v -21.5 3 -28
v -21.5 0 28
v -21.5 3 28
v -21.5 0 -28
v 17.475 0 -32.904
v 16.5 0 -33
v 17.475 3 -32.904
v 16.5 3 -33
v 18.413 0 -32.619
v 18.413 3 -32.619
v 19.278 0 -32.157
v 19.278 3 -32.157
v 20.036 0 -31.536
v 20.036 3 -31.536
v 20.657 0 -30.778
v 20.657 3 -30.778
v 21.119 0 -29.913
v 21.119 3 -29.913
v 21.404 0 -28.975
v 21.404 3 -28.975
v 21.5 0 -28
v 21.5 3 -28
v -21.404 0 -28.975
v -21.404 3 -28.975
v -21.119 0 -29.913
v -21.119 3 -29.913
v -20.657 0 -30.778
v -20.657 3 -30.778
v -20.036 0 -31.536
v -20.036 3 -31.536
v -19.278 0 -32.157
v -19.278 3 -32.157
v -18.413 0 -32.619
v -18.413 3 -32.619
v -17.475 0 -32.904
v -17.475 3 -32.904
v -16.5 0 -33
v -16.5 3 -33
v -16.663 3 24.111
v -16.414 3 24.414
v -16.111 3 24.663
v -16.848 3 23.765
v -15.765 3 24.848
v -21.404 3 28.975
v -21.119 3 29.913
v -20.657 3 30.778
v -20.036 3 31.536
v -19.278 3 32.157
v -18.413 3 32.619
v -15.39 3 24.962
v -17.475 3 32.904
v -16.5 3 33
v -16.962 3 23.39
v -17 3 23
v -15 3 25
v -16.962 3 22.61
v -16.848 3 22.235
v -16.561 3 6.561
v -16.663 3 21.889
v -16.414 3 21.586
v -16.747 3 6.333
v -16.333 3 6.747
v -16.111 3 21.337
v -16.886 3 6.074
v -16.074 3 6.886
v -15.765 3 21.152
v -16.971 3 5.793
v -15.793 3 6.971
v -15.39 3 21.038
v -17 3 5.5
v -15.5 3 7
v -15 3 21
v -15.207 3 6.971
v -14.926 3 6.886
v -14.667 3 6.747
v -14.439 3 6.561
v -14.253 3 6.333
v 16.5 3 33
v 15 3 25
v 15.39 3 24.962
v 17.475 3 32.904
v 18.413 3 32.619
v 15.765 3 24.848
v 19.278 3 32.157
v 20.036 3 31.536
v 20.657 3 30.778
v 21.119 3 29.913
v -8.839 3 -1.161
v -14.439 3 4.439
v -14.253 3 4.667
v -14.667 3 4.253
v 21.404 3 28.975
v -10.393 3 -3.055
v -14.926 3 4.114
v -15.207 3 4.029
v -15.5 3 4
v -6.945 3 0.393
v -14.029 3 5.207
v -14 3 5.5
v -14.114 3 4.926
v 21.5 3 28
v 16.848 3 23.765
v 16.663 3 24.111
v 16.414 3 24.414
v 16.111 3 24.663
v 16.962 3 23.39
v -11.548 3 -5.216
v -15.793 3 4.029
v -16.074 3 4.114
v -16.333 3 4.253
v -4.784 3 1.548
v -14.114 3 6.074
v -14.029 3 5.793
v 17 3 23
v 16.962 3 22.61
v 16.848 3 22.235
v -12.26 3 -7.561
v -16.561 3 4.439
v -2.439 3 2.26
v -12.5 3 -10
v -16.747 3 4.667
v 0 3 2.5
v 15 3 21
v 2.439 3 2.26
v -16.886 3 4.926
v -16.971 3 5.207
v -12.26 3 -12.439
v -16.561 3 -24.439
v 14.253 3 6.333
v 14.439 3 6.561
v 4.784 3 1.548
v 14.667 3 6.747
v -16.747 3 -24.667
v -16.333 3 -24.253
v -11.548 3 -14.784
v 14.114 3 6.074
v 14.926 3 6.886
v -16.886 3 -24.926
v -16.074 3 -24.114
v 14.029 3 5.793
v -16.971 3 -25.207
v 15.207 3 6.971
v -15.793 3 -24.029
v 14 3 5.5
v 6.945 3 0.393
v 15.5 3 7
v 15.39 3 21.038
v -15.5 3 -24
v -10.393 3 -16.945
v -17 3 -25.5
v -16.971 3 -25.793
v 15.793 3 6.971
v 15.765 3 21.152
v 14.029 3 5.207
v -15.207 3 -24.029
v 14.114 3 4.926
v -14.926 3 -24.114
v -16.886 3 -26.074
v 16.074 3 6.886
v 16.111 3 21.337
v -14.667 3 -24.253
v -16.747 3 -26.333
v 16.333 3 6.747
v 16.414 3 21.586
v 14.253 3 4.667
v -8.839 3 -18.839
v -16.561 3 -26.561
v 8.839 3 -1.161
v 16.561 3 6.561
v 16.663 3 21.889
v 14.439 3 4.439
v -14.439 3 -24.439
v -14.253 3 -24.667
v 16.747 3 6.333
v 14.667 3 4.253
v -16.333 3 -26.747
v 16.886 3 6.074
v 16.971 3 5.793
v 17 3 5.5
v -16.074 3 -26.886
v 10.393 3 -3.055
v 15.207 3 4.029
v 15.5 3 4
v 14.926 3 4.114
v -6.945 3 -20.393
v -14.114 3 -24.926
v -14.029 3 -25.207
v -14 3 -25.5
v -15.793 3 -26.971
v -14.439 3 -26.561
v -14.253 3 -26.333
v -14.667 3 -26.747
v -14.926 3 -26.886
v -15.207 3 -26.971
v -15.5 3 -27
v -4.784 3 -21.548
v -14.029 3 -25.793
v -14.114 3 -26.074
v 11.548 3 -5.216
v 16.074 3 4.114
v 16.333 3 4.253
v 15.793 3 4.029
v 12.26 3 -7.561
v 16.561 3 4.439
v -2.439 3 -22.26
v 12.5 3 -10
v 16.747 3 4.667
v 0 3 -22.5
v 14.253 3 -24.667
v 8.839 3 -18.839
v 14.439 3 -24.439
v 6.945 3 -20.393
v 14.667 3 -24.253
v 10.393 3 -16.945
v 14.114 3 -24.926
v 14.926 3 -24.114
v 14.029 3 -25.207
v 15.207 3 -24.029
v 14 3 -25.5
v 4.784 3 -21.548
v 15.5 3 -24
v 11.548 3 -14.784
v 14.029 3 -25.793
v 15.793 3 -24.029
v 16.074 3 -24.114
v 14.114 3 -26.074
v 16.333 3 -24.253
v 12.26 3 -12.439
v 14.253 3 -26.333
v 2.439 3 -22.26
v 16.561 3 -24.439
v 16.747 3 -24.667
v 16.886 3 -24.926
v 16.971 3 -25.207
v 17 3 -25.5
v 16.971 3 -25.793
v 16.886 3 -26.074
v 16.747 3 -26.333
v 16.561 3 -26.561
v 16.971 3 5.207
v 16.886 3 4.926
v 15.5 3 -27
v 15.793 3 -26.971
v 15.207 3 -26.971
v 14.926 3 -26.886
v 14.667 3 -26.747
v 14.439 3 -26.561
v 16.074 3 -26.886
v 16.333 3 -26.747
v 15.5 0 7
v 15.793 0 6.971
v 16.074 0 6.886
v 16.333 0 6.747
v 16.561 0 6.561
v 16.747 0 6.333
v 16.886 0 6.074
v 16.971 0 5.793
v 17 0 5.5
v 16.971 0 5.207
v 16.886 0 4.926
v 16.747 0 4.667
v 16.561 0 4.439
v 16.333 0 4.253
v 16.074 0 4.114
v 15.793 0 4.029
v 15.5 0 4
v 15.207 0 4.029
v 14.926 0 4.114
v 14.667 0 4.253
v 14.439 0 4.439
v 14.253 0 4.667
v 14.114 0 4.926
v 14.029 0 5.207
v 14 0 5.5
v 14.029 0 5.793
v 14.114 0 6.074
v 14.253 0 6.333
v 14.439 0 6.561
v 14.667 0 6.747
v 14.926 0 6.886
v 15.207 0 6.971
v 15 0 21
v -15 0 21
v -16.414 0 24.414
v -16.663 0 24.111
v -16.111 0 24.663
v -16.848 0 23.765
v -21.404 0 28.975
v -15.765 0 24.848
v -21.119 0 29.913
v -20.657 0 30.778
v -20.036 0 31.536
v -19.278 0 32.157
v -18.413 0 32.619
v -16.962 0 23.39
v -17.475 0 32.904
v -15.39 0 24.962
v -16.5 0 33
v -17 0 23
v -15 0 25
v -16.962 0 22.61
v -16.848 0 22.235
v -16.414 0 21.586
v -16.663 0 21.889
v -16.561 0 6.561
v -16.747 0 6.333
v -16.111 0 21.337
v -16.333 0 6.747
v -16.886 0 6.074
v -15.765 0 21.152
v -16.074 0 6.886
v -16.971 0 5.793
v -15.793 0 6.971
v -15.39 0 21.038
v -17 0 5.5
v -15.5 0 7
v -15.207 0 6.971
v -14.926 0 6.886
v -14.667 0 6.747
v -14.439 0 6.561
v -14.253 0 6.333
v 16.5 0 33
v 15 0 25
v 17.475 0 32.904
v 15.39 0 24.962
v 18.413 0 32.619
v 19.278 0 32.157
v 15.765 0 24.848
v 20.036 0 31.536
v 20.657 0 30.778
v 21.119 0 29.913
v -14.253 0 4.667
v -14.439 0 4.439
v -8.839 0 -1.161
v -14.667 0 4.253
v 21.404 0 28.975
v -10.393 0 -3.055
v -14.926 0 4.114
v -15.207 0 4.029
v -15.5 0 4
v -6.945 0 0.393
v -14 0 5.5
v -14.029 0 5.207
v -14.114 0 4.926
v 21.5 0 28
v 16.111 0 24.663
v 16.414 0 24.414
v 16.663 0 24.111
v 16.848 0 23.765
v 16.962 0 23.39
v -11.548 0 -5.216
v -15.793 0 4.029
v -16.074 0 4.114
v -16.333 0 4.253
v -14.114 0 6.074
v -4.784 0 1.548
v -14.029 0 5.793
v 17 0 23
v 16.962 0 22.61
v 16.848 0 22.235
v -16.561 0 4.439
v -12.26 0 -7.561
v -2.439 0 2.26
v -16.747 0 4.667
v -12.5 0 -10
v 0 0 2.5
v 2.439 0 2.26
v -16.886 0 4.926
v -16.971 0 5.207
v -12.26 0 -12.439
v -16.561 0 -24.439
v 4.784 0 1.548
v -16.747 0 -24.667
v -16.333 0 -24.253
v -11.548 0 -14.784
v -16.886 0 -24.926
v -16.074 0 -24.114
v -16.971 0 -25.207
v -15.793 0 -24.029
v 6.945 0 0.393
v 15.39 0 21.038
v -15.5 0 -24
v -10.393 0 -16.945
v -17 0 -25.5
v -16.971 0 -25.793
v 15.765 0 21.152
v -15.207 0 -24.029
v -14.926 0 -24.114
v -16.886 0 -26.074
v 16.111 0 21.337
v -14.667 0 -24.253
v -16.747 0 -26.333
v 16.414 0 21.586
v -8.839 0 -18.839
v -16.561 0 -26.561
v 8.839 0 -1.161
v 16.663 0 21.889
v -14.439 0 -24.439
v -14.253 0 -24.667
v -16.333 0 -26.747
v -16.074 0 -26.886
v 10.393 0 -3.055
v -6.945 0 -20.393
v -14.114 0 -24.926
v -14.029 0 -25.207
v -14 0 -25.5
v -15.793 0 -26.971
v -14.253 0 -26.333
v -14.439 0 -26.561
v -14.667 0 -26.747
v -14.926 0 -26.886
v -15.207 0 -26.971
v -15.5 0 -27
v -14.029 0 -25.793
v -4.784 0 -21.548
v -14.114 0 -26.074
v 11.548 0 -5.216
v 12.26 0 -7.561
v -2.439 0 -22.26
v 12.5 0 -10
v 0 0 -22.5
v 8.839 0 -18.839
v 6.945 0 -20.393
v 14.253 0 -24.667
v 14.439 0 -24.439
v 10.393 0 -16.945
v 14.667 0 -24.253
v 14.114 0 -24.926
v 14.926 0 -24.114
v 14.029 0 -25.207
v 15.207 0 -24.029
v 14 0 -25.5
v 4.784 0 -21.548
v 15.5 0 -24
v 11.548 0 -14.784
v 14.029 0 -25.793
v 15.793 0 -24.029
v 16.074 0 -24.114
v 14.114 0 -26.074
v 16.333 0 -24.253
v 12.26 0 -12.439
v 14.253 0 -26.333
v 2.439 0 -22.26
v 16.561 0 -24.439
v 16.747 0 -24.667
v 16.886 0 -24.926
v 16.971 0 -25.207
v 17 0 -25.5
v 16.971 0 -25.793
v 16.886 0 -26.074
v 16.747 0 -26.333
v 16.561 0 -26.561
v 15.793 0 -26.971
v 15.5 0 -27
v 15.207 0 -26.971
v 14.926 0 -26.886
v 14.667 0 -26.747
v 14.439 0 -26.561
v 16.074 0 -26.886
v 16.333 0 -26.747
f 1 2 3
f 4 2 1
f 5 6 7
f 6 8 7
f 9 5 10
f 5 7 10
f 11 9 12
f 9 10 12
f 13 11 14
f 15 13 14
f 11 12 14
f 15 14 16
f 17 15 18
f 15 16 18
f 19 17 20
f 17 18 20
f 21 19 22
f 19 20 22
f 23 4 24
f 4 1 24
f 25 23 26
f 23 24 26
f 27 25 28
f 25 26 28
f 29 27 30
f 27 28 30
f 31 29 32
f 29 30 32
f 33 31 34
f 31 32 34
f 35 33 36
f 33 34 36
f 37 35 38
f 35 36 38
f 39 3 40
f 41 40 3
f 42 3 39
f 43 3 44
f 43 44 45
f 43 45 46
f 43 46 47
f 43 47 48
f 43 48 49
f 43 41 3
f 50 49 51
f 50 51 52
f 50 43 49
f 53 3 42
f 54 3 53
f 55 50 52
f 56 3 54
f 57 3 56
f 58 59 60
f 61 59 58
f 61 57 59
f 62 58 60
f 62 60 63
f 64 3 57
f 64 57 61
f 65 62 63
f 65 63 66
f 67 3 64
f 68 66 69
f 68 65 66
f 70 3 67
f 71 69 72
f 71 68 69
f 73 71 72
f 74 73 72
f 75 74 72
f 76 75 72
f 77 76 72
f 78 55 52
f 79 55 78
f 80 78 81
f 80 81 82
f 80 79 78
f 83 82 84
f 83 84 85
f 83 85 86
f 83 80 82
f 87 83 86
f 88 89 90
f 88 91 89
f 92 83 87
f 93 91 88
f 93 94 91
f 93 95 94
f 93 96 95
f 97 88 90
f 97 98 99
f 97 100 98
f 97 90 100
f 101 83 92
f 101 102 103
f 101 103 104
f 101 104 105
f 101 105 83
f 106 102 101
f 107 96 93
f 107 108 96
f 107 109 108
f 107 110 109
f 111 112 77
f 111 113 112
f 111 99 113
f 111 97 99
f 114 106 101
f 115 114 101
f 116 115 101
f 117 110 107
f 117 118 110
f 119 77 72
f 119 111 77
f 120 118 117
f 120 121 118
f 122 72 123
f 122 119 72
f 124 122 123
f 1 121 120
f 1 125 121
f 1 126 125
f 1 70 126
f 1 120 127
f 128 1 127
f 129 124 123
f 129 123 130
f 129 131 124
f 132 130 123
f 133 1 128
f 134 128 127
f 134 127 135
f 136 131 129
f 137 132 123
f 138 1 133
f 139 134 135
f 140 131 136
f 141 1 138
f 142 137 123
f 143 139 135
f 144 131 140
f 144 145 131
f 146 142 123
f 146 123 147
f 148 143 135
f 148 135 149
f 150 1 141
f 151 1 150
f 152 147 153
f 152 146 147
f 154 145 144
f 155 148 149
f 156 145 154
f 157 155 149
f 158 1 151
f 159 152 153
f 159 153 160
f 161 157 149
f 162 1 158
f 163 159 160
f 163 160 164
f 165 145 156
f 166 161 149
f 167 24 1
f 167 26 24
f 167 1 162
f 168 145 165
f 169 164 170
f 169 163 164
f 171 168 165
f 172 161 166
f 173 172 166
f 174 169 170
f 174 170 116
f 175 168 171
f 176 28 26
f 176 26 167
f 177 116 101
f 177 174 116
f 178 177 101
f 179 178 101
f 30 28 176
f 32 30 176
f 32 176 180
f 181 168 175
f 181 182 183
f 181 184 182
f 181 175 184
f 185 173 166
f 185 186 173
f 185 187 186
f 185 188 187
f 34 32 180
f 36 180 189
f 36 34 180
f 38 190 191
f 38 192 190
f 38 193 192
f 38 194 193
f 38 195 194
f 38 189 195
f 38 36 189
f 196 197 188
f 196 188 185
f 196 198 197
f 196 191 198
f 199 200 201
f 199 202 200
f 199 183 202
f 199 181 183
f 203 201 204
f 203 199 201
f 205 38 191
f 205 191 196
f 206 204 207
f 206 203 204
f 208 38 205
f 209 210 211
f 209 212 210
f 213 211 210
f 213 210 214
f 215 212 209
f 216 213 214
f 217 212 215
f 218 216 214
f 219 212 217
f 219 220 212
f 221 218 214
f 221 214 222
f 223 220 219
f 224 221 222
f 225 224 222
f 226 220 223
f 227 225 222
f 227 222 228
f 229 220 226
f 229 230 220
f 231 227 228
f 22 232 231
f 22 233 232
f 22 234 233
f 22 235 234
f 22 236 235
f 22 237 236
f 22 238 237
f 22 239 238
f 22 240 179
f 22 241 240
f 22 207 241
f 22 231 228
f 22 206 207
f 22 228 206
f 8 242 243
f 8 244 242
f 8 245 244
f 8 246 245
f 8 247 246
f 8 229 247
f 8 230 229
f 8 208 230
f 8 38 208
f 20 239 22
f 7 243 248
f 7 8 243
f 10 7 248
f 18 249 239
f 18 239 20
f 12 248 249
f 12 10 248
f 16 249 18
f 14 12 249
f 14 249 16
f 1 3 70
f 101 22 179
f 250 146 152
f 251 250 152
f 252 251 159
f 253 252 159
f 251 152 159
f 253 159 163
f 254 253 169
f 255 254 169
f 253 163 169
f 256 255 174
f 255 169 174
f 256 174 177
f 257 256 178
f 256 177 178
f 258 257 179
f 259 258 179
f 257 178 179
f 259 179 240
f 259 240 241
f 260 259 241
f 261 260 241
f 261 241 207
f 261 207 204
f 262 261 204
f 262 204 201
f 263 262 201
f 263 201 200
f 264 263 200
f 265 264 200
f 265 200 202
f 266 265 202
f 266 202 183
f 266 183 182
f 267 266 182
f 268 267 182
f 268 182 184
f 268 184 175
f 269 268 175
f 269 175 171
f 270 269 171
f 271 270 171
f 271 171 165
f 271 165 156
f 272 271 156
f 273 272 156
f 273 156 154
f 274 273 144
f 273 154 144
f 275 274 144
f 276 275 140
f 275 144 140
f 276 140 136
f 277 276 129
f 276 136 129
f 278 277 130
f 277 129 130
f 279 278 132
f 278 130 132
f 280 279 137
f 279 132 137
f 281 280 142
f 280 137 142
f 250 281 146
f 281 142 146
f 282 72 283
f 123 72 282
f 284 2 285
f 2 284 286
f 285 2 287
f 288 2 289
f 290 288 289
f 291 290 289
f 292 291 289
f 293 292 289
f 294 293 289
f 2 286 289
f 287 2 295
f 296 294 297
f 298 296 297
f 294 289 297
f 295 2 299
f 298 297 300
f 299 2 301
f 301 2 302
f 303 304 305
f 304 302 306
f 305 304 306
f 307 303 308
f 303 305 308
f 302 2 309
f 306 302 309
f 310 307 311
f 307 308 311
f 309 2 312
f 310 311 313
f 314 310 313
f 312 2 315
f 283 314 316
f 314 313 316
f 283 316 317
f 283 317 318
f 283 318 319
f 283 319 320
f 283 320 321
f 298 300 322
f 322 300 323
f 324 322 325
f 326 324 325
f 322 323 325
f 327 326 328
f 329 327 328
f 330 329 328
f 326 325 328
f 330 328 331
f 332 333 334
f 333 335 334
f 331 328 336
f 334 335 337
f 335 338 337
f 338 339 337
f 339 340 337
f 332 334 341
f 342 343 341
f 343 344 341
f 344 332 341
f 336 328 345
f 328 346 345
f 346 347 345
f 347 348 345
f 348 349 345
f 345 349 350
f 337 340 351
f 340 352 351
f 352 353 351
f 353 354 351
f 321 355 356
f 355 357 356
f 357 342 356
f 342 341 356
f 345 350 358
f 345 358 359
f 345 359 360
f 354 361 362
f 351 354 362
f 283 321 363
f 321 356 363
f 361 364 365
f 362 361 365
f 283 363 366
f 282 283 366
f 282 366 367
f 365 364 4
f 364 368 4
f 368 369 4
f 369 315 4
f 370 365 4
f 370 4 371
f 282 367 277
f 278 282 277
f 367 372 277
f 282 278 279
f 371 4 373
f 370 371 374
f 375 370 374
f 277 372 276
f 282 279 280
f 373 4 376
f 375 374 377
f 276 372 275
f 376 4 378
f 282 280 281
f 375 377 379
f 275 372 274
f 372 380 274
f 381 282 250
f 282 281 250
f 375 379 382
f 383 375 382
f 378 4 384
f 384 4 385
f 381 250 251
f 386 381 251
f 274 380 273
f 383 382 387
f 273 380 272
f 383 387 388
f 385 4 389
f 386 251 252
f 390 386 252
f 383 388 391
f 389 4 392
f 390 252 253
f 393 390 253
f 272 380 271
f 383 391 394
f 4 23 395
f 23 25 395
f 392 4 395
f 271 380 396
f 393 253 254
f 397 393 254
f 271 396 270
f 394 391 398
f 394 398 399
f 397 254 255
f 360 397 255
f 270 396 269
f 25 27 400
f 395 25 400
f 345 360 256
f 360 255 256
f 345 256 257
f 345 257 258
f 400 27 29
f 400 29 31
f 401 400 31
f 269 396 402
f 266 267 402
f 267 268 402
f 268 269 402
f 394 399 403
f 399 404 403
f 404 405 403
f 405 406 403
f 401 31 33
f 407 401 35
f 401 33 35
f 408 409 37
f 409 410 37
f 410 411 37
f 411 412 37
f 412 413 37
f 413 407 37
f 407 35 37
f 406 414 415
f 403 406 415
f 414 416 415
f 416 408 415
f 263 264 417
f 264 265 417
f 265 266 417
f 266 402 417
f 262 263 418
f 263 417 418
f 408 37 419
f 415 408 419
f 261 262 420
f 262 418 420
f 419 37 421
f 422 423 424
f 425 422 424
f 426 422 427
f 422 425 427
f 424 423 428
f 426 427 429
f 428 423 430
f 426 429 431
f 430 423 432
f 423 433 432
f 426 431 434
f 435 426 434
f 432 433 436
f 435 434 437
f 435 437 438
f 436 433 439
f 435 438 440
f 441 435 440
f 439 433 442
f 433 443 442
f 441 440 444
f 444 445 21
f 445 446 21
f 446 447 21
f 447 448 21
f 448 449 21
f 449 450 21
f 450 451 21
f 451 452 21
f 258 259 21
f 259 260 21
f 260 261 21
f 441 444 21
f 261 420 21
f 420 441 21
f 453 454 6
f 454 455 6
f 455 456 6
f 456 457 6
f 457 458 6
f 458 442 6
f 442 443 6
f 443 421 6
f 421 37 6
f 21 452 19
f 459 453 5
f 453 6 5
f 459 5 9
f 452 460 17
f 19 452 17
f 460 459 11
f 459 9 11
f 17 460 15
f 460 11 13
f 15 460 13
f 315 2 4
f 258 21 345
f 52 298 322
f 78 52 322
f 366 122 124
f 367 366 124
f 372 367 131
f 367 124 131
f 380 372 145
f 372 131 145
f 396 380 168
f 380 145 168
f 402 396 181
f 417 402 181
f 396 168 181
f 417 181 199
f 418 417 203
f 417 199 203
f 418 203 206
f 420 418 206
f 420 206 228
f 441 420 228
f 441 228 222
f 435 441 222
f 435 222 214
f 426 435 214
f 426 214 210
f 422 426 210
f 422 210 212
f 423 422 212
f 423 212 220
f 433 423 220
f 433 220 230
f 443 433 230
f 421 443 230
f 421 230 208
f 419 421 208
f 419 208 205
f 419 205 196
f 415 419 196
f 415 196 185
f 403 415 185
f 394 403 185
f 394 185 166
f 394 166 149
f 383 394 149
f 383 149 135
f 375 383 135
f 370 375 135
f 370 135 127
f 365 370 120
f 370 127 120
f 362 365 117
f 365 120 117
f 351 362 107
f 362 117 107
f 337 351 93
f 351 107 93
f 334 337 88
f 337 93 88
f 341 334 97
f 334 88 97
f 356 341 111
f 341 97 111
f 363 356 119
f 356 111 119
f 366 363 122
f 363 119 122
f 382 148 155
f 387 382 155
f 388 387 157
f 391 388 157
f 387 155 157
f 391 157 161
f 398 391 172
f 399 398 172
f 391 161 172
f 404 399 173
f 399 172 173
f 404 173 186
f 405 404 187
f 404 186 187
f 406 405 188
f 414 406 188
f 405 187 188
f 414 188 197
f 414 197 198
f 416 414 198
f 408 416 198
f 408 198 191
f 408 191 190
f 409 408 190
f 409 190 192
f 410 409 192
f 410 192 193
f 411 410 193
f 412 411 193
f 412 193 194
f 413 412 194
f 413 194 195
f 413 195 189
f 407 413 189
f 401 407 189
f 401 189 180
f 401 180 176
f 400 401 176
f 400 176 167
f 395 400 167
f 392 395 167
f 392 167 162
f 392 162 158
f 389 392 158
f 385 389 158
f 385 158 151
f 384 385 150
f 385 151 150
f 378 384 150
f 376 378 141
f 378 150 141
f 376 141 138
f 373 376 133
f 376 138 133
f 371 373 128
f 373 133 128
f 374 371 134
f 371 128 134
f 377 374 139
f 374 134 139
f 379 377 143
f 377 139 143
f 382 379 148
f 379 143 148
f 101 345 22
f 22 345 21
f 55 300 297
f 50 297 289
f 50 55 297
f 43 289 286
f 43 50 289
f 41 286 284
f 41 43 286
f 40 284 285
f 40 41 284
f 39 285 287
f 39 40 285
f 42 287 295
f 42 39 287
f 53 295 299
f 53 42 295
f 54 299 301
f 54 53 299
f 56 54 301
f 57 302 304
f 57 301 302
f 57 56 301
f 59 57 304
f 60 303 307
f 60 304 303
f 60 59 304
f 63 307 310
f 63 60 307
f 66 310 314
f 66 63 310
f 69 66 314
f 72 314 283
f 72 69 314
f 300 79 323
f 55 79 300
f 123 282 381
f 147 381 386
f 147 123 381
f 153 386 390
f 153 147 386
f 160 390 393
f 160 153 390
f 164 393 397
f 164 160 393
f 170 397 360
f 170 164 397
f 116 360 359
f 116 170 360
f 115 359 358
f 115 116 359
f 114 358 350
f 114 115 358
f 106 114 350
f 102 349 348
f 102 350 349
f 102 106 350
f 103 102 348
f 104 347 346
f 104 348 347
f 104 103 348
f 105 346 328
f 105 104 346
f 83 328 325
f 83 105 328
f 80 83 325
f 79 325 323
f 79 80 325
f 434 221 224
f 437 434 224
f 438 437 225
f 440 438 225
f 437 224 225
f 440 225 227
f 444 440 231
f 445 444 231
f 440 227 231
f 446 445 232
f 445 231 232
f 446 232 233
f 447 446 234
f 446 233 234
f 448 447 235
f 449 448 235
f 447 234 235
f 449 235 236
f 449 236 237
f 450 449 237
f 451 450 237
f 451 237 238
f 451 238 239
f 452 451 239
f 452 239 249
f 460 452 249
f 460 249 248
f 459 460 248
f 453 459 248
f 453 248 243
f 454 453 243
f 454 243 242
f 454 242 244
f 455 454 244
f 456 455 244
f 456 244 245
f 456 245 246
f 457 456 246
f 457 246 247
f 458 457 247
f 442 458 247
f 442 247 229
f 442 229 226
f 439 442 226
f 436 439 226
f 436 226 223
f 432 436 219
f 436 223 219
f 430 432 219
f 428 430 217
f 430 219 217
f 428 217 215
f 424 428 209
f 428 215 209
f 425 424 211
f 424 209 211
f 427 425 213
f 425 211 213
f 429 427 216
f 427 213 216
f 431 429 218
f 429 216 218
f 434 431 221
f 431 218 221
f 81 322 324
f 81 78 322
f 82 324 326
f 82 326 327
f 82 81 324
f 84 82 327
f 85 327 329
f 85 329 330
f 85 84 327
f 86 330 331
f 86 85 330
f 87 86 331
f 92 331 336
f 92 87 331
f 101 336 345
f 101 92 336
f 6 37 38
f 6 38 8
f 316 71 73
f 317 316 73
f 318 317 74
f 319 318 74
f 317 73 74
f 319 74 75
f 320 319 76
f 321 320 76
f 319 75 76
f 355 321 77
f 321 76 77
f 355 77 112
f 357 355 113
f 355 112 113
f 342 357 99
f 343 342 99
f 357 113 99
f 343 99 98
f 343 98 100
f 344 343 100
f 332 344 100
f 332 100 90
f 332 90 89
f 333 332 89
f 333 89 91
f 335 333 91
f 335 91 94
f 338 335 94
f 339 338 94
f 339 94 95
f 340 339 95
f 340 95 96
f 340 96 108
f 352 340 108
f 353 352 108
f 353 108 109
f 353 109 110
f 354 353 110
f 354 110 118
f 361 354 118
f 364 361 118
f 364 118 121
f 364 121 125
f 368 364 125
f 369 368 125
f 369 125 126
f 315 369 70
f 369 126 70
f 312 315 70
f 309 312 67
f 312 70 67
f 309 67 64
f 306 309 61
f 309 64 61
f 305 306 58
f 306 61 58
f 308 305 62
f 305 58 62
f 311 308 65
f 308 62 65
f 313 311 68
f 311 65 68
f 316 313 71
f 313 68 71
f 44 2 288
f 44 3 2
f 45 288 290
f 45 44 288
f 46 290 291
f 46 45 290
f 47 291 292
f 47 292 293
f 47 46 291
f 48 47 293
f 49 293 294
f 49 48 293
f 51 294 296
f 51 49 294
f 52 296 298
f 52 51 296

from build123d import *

# Parameters (mm, degrees)
SKETCH1_W           = 43
SKETCH1_H           = 66
BOSS_EXTRUDE1_DEPTH = 3
SKETCH2_R           = 1.5
SKETCH2_R_2         = 12.5
CUT_EXTRUDE1_DEPTH  = 40.5
FILLET1_R           = 5


with BuildPart() as part:
    # Sketch1 → Boss-Extrude1 (new body)
    with BuildSketch(Plane(origin=(0, 0, 0), x_dir=(1, 0, 0), z_dir=(0, 1, 0))):
        Rectangle(SKETCH1_W, SKETCH1_H)
    extrude(amount=BOSS_EXTRUDE1_DEPTH)

    # Sketch2 → Cut-Extrude1 (cut, through all)
    with BuildSketch(Plane(origin=(0, 3, 0), x_dir=(1, 0, 0), z_dir=(0, 1, 0))):
        with Locations(Location((15.5, 25.5, 0), (0, 0, 270))):
            Circle(SKETCH2_R)
        with Locations(Location((-15.5, 25.5, 0), (0, 0, 270))):
            Circle(SKETCH2_R)
        with Locations(Location((-15.5, -5.5, 0), (0, 0, 270))):
            Circle(SKETCH2_R)
        with Locations(Location((15.5, -5.5, 0), (0, 0, 270))):
            Circle(SKETCH2_R)
        with Locations(Location((0, 10, 0), (0, 0, 270))):
            Circle(SKETCH2_R_2)
        with BuildLine():
            Line((-15, -21), (15, -21))
            ThreePointArc((15, -21), (17, -23), (15, -25))
            Line((15, -25), (-15, -25))
            ThreePointArc((-15, -25), (-17, -23), (-15, -21))
        make_face()
    extrude(amount=-CUT_EXTRUDE1_DEPTH, mode=Mode.SUBTRACT)

    # Fillet1
    fillet1_edges = [part.edges().sort_by_distance(p)[0] for p in [
        (-21.5, 1.5, -33),
        (21.5, 1.5, -33),
        (21.5, 1.5, 33),
        (-21.5, 1.5, 33),
    ]]
    fillet(fillet1_edges, radius=FILLET1_R)


solid = part.part
